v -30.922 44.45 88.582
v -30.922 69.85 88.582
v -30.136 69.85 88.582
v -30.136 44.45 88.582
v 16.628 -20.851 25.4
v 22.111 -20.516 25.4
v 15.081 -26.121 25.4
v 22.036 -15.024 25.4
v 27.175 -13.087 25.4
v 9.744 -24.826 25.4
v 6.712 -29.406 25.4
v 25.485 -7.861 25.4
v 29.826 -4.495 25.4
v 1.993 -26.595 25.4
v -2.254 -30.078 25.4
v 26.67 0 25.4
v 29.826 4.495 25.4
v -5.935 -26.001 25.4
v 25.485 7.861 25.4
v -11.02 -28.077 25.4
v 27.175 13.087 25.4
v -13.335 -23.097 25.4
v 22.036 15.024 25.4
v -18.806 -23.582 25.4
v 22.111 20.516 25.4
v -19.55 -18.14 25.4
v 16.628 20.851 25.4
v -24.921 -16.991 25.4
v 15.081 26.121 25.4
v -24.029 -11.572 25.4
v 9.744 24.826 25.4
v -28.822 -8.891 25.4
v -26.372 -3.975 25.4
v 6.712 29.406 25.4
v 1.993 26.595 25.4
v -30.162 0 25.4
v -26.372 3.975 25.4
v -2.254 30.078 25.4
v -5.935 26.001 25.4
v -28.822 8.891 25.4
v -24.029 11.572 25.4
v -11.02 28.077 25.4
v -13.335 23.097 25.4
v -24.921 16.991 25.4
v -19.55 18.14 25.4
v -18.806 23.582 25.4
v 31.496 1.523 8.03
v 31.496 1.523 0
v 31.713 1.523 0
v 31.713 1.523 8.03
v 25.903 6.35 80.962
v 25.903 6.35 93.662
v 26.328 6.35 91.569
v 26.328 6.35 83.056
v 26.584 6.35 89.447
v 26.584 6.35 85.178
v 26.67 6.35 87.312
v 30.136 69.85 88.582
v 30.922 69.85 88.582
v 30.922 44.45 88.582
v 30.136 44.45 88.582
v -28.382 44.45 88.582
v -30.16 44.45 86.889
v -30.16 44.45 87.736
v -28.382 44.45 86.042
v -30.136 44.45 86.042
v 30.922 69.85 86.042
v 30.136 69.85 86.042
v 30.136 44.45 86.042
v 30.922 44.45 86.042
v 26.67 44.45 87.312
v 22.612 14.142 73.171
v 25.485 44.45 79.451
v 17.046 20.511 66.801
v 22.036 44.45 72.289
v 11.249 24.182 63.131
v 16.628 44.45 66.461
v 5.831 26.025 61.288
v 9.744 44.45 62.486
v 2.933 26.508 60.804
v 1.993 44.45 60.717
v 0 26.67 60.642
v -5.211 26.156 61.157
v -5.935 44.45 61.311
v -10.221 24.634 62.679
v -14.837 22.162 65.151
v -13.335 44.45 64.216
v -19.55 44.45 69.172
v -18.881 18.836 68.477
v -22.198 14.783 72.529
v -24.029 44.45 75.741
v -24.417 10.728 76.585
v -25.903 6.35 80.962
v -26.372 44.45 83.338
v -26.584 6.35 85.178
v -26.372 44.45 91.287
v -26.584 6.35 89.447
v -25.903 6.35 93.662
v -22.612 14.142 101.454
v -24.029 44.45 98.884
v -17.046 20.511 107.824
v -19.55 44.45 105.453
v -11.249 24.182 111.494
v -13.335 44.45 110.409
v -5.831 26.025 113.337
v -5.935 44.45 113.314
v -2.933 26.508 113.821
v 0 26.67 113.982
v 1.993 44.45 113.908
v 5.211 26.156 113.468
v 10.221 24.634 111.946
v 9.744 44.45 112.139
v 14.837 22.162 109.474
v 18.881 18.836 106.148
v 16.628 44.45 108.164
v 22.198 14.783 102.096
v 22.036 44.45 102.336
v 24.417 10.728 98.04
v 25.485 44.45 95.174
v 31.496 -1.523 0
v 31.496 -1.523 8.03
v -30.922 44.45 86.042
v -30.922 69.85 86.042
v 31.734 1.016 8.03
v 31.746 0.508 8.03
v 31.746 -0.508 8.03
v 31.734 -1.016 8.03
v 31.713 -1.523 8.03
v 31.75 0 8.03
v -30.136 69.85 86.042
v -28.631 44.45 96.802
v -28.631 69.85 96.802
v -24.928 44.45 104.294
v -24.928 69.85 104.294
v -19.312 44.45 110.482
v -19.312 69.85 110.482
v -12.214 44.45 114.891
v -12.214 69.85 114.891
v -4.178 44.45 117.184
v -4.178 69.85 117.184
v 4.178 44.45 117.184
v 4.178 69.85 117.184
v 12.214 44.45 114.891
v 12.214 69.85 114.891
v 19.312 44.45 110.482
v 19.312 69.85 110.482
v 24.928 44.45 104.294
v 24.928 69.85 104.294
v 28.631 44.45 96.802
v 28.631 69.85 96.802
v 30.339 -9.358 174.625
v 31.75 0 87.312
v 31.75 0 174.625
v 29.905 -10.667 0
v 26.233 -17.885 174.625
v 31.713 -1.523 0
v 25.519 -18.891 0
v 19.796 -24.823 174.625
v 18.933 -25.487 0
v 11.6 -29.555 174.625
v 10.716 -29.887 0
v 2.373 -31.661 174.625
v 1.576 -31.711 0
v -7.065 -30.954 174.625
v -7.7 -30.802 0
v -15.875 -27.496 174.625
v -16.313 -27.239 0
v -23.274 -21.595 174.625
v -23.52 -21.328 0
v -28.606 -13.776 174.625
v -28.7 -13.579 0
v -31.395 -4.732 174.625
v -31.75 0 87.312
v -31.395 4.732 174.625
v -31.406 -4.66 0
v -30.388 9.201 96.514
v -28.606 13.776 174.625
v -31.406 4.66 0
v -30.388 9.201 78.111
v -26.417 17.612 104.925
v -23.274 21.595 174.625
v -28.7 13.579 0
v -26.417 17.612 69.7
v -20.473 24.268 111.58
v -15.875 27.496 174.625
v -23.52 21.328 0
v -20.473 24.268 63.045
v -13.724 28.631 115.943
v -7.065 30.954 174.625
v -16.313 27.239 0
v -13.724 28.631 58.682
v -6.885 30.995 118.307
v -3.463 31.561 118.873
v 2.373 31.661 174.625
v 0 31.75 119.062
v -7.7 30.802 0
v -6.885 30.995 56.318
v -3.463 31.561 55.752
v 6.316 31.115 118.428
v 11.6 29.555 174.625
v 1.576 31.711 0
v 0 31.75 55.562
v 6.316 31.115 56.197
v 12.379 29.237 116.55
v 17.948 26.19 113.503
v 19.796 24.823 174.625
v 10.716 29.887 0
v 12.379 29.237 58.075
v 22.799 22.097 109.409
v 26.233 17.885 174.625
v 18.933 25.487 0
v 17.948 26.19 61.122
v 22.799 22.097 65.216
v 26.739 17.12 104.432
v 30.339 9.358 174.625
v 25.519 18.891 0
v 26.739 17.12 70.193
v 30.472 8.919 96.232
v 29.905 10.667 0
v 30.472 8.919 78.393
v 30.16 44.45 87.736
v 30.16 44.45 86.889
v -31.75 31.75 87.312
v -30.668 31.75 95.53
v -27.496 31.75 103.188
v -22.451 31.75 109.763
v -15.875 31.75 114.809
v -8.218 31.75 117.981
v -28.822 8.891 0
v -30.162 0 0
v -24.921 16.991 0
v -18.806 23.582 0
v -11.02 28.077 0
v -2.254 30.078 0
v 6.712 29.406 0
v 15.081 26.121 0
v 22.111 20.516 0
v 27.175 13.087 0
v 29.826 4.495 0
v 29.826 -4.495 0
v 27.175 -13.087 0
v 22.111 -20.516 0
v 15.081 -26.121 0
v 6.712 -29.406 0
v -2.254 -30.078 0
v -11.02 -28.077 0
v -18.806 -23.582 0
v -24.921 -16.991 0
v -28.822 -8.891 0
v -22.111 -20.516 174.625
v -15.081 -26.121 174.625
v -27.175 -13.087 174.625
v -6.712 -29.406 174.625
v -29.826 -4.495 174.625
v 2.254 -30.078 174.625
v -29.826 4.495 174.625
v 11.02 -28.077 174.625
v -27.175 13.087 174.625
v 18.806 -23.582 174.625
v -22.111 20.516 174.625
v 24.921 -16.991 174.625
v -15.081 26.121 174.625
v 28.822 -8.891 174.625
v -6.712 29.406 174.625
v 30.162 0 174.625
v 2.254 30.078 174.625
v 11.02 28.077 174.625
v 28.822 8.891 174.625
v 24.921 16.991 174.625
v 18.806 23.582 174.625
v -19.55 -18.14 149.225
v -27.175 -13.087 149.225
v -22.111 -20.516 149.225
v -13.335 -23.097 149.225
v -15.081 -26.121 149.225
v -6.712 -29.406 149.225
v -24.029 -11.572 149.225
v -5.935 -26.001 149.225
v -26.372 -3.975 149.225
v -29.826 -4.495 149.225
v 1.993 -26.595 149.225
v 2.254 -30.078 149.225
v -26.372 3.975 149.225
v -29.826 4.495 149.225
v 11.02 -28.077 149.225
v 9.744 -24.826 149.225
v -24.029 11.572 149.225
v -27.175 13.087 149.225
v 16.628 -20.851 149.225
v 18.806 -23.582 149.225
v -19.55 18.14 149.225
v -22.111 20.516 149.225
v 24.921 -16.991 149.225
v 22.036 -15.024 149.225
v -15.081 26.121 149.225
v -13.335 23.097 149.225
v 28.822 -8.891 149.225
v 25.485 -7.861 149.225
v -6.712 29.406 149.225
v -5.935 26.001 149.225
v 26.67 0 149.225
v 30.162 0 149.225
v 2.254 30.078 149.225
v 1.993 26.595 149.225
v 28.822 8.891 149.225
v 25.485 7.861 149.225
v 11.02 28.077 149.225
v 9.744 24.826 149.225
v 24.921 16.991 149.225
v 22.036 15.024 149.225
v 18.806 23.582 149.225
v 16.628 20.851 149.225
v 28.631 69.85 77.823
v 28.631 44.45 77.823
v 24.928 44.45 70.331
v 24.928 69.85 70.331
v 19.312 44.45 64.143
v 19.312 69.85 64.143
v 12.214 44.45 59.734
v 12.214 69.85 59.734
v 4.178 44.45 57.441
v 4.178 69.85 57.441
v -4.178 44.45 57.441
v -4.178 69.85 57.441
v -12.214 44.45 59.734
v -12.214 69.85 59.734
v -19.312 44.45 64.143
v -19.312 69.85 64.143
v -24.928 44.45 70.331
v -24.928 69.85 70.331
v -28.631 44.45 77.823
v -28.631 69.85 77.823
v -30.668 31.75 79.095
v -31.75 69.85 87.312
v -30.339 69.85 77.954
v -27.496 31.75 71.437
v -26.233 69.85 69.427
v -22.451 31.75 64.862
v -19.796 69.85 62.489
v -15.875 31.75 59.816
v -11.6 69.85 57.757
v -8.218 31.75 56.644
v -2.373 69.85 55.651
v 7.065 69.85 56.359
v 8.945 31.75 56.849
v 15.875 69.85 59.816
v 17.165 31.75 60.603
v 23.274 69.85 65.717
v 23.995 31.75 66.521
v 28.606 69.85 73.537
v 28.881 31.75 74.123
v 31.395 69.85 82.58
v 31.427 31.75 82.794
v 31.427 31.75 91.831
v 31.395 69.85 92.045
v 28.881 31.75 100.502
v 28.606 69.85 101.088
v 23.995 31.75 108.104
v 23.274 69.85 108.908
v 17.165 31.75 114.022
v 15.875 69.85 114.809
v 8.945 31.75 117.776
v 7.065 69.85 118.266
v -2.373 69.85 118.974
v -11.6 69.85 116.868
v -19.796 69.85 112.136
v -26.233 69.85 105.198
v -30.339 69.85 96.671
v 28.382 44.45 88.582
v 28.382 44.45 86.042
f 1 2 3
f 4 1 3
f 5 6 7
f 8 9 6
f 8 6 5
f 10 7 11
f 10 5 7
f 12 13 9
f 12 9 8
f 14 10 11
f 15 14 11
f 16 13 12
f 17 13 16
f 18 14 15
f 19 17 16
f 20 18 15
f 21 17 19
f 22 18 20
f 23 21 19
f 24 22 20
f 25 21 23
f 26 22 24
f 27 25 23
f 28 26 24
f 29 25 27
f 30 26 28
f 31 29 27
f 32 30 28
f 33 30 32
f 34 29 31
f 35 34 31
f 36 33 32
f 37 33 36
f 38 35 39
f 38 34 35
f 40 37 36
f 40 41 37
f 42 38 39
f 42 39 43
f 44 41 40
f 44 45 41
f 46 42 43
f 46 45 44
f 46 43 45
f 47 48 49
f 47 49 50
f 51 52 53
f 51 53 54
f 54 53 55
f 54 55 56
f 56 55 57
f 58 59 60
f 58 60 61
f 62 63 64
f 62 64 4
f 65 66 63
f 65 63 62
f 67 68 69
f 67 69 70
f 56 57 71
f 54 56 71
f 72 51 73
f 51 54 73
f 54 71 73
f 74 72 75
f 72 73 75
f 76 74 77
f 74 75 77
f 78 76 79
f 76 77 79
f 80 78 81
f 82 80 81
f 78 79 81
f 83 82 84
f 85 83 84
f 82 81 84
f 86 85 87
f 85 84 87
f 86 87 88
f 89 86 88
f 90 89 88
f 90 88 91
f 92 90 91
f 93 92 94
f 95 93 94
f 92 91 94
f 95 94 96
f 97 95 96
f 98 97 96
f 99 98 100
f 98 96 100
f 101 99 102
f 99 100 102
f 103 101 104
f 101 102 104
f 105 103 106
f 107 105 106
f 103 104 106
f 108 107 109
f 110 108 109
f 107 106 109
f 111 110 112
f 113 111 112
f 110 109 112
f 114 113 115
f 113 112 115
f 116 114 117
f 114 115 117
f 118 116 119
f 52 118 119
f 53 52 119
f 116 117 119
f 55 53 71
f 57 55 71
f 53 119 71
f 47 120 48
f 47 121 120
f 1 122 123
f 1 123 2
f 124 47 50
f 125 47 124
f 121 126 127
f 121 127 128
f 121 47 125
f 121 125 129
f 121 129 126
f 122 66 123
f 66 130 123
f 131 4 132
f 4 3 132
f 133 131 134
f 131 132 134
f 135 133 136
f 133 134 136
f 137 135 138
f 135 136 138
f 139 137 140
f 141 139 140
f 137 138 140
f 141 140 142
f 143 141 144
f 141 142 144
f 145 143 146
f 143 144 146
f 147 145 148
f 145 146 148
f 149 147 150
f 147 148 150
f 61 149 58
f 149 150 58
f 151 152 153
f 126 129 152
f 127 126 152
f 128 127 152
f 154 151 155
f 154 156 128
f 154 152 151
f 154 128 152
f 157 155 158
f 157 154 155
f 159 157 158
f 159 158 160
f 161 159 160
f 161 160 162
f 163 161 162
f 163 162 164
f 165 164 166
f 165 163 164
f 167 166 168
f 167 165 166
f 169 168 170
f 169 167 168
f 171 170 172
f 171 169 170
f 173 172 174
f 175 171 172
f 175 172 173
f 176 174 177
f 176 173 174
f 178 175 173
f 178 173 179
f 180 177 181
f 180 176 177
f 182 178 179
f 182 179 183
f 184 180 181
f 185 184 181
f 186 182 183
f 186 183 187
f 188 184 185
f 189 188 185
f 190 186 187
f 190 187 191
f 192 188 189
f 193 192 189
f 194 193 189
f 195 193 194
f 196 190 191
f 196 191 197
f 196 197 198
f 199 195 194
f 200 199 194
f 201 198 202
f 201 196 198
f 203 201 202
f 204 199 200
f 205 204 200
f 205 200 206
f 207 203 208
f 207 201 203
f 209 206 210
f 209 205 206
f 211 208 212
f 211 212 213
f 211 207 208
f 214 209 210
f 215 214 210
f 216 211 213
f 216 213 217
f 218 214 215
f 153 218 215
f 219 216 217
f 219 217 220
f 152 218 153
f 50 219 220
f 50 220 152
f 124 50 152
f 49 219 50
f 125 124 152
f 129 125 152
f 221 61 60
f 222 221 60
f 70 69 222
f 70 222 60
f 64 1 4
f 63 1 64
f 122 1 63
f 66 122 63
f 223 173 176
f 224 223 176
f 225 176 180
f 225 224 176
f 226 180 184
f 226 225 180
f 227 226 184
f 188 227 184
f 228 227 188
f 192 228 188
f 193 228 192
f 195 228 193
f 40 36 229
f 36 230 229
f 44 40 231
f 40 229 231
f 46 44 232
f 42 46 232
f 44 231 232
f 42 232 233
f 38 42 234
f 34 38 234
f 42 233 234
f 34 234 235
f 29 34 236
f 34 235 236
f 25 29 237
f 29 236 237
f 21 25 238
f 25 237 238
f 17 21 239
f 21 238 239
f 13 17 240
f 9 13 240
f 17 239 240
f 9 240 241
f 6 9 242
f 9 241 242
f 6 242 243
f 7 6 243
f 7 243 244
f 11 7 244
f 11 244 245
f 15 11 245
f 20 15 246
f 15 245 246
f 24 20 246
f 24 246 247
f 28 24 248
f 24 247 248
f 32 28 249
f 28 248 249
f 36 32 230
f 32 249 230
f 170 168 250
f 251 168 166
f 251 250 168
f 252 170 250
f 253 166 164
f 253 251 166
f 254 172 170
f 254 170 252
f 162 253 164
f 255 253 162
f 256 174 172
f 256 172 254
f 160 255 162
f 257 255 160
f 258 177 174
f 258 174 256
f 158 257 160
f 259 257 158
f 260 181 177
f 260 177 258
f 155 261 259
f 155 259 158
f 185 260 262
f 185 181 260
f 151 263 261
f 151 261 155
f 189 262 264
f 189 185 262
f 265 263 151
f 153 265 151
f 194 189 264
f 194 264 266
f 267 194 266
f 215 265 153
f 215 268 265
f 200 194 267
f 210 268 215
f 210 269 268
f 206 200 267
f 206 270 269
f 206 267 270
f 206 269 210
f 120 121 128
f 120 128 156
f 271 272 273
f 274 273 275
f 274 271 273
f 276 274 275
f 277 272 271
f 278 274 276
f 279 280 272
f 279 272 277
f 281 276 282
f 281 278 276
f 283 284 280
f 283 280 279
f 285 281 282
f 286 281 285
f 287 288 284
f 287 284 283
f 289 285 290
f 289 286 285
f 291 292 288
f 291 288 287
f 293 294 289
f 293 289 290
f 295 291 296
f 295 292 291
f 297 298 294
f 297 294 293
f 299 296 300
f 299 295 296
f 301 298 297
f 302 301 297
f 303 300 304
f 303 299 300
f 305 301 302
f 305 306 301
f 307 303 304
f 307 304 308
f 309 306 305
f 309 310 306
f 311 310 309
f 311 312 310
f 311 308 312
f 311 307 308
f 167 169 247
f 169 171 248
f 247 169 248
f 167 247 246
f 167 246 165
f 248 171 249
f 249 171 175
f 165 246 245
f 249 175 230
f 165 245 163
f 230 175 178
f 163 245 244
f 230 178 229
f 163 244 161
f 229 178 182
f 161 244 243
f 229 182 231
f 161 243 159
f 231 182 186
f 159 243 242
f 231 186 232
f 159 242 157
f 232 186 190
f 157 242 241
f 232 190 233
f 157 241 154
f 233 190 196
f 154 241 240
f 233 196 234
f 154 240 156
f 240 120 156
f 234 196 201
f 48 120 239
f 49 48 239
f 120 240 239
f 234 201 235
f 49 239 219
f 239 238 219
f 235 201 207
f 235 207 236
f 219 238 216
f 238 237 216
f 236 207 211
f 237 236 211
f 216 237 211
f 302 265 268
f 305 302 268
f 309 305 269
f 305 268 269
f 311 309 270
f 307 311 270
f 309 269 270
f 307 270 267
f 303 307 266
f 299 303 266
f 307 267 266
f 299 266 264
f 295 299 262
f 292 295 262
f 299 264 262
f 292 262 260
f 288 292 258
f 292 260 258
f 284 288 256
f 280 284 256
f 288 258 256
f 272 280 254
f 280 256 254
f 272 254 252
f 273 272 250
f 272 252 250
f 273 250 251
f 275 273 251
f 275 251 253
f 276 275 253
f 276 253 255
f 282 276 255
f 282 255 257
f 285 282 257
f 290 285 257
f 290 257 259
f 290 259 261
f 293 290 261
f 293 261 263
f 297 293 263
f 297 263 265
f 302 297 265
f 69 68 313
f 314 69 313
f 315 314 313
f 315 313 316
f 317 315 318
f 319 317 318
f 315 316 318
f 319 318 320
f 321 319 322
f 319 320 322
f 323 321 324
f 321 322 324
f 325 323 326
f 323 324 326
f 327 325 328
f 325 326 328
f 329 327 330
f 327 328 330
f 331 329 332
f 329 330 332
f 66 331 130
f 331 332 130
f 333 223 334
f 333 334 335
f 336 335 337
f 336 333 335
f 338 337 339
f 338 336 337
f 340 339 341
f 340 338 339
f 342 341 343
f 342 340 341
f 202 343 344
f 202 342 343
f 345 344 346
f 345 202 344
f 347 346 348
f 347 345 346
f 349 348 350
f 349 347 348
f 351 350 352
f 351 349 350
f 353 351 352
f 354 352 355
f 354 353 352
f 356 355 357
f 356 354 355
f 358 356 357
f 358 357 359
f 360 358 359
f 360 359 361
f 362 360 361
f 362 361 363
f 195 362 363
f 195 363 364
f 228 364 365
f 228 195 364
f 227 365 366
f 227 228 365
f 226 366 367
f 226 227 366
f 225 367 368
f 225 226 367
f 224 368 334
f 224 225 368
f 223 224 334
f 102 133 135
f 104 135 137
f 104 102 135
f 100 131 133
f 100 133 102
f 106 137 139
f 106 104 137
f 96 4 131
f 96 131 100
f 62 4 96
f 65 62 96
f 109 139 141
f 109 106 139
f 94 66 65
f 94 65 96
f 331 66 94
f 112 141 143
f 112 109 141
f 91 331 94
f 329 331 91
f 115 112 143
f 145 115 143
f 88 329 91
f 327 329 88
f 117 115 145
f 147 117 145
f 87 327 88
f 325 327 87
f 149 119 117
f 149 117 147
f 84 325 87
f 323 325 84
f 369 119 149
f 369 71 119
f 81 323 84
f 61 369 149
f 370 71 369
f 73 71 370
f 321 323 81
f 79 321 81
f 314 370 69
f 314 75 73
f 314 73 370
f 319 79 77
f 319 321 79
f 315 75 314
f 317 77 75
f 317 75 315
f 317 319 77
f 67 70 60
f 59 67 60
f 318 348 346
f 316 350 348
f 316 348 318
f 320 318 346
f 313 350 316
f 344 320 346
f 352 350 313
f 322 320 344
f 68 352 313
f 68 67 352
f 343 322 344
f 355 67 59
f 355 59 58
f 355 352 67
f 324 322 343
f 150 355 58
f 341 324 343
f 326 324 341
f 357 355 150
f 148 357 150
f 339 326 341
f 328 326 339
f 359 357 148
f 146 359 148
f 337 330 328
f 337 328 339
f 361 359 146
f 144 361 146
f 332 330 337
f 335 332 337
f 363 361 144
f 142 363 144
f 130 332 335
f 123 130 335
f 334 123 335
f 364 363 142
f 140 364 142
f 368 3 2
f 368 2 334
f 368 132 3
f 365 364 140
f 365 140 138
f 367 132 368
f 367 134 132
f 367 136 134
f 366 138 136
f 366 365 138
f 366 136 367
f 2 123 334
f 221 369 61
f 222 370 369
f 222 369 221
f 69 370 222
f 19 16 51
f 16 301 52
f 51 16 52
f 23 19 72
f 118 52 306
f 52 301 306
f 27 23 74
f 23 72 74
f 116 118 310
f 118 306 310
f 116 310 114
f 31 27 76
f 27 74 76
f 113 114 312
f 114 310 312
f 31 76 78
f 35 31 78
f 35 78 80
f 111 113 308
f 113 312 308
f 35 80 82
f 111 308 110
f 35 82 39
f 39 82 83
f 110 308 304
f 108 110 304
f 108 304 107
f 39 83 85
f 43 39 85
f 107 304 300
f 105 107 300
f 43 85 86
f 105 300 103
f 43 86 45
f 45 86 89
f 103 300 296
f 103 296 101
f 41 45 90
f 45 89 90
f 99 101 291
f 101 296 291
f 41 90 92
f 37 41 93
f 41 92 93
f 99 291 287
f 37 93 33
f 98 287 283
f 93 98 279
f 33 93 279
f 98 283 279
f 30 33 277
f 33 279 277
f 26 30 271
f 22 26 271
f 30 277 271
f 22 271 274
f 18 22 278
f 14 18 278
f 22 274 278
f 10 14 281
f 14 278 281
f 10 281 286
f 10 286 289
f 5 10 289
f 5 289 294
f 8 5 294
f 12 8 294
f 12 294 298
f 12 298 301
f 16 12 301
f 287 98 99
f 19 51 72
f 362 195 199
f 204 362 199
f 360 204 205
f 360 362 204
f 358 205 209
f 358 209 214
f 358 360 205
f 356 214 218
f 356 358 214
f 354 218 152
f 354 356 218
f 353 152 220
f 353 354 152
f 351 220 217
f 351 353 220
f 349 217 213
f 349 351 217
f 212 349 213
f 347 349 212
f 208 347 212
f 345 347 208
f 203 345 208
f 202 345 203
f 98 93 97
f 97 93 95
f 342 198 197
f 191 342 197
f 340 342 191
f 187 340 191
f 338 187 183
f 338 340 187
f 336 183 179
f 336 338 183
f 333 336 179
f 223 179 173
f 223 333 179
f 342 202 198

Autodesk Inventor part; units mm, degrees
ref_plane "XZ Plane" through (0, 0, 0) normal (0, 1, 0) x (-1, 0, 0)
sketch "Sketch1" plane through (0, 0, 0) normal (0, 0, 1) x (1, 0, 0)
  circle A0 centre (0, 0) radius 31.75
  dimension "d0" = 63.5
extrude "mainBody" add sketch "Sketch1" along normal blind 174.625
sketch "Sketch10" plane through (0, 0, 174.625) normal (0, 0, 1) x (1, 0, 0)
  circle A0 centre (0, 0) radius 30.1625 projected
  circle A1 centre (0, 0) radius 31.75 projected
  point P0 (0, 31.75)
ref_plane "Work Plane5" through (0, 31.75, 174.625) normal (0, 1, 0) x (-1, 0, 0)
sketch "Sketch11" plane through (0, 31.75, 174.625) normal (0, 1, 0) x (-1, 0, 0)
  circle A0 centre (0, -87.3125) radius 31.75
  line L0 (31.75, 0) -> (-31.75, 0) projected
  point P0 (0, -174.625)
  dimension "d29" = 87.3125
  dimension "d30" = 63.5
extrude "TBody" add sketch "Sketch11" along normal blind 38.1 and the other way blind 31.75
sketch "Sketch12" plane through (0, 69.85, 87.3125) normal (0, 1, 0) x (1, 0, 0)
  circle A0 centre (0, 0) radius 31.75 projected
  circle A1 centre (0, 0) radius 30.1625
  point P0 (0, 87.3125)
  dimension "d35" = 60.325
extrude "TSocket" cut sketch "Sketch12" against normal blind 25.4 contours A1
sketch "Sketch13" plane through (0, 44.45, 87.3125) normal (0, 1, 0) x (1, 0, 0)
  circle A0 centre (0, 0) radius 30.1625 projected
  circle A1 centre (0, 0) radius 26.67
  point P0 (0, 87.3125)
  dimension "d39" = 53.34
extrude "TTube" cut sketch "Sketch13" against normal blind 38.1 contours A1
sketch "Sketch14" plane through (0, 0, 174.625) normal (0, 0, 1) x (1, 0, 0)
  circle A0 centre (0, 0) radius 31.75 projected
  circle A1 centre (0, 0) radius 26.67
  dimension "d43" = 53.34
extrude "mainTube" cut sketch "Sketch14" against normal blind 177.8 contours A1
sketch "Sketch15" plane through (0, 0, 174.625) normal (0, 0, 1) x (1, 0, 0)
  circle A0 centre (0, 0) radius 26.67 projected
  circle A1 centre (0, 0) radius 31.75 projected
  circle A2 centre (0, 0) radius 30.1625
  dimension "d47" = 60.325
extrude "mainSocket1" cut sketch "Sketch15" against normal blind 25.4 contours A2
sketch "Sketch16" plane through (0, 0, 0) normal (0, 0, -1) x (-1, 0, 0)
  circle A0 centre (0, 0) radius 26.67 projected
  circle A1 centre (0, 0) radius 31.75 projected
  circle A2 centre (0, 0) radius 30.1625
  dimension "d51" = 60.325
extrude "mainSocket2" cut sketch "Sketch16" against normal blind 25.4 contours A2
sketch "Sketch24" plane through (0, 69.85, 87.3125) normal (0, 1, 0) x (1, 0, 0)
  circle A0 centre (0, 0) radius 30.1625 projected
  line L0 (-30.1625, 0) -> (30.1625, 0) construction
  line L1 (0, 30.1625) -> (0, -30.1625) construction
  line L2 (-30.9225, -1.27) -> (-28.3825, -1.27)
  line L3 (-28.3825, -1.27) -> (-28.3825, 1.27)
  line L4 (-28.3825, 1.27) -> (-30.9225, 1.27)
  line L5 (-30.9225, 1.27) -> (-30.9225, -1.27)
  line L6 (-30.9225, 0) -> (-28.3825, 0) construction
  line L7 (30.9225, -1.27) -> (28.3825, -1.27)
  line L8 (28.3825, -1.27) -> (28.3825, 1.27)
  line L9 (28.3825, 1.27) -> (30.9225, 1.27)
  line L10 (30.9225, 1.27) -> (30.9225, -1.27)
  line L11 (30.9225, 0) -> (28.3825, 0) construction
  point P0 (0, 87.3125)
  dimension "d72" = 2.54
  dimension "d75" = 2.54
extrude "Extrusion20" cut sketch "Sketch24" against normal blind 25.4 contours A0 L7 L8 L9 | A0 L9 L10 L7 | L4 L3 L2 A0 | A0 L2 L5 L4
ref_plane "Work Plane6" through (31.496, 0, 0) normal (1, 0, 0) x (0, 1, 0)
sketch "Sketch27" plane through (31.496, 0, 0) normal (1, 0, 0) x (0, 1, 0)
  line L0 (-1.5232, -1.2223) -> (1.5232, -1.2223)
  line L1 (1.5232, -1.2223) -> (1.5232, 8.0295)
  line L2 (1.5232, 8.0295) -> (-1.5232, 8.0295)
  line L3 (-1.5232, 8.0295) -> (-1.5232, -1.2223)
  point P0 (0, 0)
extrude "Extrusion22" cut sketch "Sketch27" along normal blind 25.4
properties part number "0pvc_T_2in" material "PVC-Piping"
